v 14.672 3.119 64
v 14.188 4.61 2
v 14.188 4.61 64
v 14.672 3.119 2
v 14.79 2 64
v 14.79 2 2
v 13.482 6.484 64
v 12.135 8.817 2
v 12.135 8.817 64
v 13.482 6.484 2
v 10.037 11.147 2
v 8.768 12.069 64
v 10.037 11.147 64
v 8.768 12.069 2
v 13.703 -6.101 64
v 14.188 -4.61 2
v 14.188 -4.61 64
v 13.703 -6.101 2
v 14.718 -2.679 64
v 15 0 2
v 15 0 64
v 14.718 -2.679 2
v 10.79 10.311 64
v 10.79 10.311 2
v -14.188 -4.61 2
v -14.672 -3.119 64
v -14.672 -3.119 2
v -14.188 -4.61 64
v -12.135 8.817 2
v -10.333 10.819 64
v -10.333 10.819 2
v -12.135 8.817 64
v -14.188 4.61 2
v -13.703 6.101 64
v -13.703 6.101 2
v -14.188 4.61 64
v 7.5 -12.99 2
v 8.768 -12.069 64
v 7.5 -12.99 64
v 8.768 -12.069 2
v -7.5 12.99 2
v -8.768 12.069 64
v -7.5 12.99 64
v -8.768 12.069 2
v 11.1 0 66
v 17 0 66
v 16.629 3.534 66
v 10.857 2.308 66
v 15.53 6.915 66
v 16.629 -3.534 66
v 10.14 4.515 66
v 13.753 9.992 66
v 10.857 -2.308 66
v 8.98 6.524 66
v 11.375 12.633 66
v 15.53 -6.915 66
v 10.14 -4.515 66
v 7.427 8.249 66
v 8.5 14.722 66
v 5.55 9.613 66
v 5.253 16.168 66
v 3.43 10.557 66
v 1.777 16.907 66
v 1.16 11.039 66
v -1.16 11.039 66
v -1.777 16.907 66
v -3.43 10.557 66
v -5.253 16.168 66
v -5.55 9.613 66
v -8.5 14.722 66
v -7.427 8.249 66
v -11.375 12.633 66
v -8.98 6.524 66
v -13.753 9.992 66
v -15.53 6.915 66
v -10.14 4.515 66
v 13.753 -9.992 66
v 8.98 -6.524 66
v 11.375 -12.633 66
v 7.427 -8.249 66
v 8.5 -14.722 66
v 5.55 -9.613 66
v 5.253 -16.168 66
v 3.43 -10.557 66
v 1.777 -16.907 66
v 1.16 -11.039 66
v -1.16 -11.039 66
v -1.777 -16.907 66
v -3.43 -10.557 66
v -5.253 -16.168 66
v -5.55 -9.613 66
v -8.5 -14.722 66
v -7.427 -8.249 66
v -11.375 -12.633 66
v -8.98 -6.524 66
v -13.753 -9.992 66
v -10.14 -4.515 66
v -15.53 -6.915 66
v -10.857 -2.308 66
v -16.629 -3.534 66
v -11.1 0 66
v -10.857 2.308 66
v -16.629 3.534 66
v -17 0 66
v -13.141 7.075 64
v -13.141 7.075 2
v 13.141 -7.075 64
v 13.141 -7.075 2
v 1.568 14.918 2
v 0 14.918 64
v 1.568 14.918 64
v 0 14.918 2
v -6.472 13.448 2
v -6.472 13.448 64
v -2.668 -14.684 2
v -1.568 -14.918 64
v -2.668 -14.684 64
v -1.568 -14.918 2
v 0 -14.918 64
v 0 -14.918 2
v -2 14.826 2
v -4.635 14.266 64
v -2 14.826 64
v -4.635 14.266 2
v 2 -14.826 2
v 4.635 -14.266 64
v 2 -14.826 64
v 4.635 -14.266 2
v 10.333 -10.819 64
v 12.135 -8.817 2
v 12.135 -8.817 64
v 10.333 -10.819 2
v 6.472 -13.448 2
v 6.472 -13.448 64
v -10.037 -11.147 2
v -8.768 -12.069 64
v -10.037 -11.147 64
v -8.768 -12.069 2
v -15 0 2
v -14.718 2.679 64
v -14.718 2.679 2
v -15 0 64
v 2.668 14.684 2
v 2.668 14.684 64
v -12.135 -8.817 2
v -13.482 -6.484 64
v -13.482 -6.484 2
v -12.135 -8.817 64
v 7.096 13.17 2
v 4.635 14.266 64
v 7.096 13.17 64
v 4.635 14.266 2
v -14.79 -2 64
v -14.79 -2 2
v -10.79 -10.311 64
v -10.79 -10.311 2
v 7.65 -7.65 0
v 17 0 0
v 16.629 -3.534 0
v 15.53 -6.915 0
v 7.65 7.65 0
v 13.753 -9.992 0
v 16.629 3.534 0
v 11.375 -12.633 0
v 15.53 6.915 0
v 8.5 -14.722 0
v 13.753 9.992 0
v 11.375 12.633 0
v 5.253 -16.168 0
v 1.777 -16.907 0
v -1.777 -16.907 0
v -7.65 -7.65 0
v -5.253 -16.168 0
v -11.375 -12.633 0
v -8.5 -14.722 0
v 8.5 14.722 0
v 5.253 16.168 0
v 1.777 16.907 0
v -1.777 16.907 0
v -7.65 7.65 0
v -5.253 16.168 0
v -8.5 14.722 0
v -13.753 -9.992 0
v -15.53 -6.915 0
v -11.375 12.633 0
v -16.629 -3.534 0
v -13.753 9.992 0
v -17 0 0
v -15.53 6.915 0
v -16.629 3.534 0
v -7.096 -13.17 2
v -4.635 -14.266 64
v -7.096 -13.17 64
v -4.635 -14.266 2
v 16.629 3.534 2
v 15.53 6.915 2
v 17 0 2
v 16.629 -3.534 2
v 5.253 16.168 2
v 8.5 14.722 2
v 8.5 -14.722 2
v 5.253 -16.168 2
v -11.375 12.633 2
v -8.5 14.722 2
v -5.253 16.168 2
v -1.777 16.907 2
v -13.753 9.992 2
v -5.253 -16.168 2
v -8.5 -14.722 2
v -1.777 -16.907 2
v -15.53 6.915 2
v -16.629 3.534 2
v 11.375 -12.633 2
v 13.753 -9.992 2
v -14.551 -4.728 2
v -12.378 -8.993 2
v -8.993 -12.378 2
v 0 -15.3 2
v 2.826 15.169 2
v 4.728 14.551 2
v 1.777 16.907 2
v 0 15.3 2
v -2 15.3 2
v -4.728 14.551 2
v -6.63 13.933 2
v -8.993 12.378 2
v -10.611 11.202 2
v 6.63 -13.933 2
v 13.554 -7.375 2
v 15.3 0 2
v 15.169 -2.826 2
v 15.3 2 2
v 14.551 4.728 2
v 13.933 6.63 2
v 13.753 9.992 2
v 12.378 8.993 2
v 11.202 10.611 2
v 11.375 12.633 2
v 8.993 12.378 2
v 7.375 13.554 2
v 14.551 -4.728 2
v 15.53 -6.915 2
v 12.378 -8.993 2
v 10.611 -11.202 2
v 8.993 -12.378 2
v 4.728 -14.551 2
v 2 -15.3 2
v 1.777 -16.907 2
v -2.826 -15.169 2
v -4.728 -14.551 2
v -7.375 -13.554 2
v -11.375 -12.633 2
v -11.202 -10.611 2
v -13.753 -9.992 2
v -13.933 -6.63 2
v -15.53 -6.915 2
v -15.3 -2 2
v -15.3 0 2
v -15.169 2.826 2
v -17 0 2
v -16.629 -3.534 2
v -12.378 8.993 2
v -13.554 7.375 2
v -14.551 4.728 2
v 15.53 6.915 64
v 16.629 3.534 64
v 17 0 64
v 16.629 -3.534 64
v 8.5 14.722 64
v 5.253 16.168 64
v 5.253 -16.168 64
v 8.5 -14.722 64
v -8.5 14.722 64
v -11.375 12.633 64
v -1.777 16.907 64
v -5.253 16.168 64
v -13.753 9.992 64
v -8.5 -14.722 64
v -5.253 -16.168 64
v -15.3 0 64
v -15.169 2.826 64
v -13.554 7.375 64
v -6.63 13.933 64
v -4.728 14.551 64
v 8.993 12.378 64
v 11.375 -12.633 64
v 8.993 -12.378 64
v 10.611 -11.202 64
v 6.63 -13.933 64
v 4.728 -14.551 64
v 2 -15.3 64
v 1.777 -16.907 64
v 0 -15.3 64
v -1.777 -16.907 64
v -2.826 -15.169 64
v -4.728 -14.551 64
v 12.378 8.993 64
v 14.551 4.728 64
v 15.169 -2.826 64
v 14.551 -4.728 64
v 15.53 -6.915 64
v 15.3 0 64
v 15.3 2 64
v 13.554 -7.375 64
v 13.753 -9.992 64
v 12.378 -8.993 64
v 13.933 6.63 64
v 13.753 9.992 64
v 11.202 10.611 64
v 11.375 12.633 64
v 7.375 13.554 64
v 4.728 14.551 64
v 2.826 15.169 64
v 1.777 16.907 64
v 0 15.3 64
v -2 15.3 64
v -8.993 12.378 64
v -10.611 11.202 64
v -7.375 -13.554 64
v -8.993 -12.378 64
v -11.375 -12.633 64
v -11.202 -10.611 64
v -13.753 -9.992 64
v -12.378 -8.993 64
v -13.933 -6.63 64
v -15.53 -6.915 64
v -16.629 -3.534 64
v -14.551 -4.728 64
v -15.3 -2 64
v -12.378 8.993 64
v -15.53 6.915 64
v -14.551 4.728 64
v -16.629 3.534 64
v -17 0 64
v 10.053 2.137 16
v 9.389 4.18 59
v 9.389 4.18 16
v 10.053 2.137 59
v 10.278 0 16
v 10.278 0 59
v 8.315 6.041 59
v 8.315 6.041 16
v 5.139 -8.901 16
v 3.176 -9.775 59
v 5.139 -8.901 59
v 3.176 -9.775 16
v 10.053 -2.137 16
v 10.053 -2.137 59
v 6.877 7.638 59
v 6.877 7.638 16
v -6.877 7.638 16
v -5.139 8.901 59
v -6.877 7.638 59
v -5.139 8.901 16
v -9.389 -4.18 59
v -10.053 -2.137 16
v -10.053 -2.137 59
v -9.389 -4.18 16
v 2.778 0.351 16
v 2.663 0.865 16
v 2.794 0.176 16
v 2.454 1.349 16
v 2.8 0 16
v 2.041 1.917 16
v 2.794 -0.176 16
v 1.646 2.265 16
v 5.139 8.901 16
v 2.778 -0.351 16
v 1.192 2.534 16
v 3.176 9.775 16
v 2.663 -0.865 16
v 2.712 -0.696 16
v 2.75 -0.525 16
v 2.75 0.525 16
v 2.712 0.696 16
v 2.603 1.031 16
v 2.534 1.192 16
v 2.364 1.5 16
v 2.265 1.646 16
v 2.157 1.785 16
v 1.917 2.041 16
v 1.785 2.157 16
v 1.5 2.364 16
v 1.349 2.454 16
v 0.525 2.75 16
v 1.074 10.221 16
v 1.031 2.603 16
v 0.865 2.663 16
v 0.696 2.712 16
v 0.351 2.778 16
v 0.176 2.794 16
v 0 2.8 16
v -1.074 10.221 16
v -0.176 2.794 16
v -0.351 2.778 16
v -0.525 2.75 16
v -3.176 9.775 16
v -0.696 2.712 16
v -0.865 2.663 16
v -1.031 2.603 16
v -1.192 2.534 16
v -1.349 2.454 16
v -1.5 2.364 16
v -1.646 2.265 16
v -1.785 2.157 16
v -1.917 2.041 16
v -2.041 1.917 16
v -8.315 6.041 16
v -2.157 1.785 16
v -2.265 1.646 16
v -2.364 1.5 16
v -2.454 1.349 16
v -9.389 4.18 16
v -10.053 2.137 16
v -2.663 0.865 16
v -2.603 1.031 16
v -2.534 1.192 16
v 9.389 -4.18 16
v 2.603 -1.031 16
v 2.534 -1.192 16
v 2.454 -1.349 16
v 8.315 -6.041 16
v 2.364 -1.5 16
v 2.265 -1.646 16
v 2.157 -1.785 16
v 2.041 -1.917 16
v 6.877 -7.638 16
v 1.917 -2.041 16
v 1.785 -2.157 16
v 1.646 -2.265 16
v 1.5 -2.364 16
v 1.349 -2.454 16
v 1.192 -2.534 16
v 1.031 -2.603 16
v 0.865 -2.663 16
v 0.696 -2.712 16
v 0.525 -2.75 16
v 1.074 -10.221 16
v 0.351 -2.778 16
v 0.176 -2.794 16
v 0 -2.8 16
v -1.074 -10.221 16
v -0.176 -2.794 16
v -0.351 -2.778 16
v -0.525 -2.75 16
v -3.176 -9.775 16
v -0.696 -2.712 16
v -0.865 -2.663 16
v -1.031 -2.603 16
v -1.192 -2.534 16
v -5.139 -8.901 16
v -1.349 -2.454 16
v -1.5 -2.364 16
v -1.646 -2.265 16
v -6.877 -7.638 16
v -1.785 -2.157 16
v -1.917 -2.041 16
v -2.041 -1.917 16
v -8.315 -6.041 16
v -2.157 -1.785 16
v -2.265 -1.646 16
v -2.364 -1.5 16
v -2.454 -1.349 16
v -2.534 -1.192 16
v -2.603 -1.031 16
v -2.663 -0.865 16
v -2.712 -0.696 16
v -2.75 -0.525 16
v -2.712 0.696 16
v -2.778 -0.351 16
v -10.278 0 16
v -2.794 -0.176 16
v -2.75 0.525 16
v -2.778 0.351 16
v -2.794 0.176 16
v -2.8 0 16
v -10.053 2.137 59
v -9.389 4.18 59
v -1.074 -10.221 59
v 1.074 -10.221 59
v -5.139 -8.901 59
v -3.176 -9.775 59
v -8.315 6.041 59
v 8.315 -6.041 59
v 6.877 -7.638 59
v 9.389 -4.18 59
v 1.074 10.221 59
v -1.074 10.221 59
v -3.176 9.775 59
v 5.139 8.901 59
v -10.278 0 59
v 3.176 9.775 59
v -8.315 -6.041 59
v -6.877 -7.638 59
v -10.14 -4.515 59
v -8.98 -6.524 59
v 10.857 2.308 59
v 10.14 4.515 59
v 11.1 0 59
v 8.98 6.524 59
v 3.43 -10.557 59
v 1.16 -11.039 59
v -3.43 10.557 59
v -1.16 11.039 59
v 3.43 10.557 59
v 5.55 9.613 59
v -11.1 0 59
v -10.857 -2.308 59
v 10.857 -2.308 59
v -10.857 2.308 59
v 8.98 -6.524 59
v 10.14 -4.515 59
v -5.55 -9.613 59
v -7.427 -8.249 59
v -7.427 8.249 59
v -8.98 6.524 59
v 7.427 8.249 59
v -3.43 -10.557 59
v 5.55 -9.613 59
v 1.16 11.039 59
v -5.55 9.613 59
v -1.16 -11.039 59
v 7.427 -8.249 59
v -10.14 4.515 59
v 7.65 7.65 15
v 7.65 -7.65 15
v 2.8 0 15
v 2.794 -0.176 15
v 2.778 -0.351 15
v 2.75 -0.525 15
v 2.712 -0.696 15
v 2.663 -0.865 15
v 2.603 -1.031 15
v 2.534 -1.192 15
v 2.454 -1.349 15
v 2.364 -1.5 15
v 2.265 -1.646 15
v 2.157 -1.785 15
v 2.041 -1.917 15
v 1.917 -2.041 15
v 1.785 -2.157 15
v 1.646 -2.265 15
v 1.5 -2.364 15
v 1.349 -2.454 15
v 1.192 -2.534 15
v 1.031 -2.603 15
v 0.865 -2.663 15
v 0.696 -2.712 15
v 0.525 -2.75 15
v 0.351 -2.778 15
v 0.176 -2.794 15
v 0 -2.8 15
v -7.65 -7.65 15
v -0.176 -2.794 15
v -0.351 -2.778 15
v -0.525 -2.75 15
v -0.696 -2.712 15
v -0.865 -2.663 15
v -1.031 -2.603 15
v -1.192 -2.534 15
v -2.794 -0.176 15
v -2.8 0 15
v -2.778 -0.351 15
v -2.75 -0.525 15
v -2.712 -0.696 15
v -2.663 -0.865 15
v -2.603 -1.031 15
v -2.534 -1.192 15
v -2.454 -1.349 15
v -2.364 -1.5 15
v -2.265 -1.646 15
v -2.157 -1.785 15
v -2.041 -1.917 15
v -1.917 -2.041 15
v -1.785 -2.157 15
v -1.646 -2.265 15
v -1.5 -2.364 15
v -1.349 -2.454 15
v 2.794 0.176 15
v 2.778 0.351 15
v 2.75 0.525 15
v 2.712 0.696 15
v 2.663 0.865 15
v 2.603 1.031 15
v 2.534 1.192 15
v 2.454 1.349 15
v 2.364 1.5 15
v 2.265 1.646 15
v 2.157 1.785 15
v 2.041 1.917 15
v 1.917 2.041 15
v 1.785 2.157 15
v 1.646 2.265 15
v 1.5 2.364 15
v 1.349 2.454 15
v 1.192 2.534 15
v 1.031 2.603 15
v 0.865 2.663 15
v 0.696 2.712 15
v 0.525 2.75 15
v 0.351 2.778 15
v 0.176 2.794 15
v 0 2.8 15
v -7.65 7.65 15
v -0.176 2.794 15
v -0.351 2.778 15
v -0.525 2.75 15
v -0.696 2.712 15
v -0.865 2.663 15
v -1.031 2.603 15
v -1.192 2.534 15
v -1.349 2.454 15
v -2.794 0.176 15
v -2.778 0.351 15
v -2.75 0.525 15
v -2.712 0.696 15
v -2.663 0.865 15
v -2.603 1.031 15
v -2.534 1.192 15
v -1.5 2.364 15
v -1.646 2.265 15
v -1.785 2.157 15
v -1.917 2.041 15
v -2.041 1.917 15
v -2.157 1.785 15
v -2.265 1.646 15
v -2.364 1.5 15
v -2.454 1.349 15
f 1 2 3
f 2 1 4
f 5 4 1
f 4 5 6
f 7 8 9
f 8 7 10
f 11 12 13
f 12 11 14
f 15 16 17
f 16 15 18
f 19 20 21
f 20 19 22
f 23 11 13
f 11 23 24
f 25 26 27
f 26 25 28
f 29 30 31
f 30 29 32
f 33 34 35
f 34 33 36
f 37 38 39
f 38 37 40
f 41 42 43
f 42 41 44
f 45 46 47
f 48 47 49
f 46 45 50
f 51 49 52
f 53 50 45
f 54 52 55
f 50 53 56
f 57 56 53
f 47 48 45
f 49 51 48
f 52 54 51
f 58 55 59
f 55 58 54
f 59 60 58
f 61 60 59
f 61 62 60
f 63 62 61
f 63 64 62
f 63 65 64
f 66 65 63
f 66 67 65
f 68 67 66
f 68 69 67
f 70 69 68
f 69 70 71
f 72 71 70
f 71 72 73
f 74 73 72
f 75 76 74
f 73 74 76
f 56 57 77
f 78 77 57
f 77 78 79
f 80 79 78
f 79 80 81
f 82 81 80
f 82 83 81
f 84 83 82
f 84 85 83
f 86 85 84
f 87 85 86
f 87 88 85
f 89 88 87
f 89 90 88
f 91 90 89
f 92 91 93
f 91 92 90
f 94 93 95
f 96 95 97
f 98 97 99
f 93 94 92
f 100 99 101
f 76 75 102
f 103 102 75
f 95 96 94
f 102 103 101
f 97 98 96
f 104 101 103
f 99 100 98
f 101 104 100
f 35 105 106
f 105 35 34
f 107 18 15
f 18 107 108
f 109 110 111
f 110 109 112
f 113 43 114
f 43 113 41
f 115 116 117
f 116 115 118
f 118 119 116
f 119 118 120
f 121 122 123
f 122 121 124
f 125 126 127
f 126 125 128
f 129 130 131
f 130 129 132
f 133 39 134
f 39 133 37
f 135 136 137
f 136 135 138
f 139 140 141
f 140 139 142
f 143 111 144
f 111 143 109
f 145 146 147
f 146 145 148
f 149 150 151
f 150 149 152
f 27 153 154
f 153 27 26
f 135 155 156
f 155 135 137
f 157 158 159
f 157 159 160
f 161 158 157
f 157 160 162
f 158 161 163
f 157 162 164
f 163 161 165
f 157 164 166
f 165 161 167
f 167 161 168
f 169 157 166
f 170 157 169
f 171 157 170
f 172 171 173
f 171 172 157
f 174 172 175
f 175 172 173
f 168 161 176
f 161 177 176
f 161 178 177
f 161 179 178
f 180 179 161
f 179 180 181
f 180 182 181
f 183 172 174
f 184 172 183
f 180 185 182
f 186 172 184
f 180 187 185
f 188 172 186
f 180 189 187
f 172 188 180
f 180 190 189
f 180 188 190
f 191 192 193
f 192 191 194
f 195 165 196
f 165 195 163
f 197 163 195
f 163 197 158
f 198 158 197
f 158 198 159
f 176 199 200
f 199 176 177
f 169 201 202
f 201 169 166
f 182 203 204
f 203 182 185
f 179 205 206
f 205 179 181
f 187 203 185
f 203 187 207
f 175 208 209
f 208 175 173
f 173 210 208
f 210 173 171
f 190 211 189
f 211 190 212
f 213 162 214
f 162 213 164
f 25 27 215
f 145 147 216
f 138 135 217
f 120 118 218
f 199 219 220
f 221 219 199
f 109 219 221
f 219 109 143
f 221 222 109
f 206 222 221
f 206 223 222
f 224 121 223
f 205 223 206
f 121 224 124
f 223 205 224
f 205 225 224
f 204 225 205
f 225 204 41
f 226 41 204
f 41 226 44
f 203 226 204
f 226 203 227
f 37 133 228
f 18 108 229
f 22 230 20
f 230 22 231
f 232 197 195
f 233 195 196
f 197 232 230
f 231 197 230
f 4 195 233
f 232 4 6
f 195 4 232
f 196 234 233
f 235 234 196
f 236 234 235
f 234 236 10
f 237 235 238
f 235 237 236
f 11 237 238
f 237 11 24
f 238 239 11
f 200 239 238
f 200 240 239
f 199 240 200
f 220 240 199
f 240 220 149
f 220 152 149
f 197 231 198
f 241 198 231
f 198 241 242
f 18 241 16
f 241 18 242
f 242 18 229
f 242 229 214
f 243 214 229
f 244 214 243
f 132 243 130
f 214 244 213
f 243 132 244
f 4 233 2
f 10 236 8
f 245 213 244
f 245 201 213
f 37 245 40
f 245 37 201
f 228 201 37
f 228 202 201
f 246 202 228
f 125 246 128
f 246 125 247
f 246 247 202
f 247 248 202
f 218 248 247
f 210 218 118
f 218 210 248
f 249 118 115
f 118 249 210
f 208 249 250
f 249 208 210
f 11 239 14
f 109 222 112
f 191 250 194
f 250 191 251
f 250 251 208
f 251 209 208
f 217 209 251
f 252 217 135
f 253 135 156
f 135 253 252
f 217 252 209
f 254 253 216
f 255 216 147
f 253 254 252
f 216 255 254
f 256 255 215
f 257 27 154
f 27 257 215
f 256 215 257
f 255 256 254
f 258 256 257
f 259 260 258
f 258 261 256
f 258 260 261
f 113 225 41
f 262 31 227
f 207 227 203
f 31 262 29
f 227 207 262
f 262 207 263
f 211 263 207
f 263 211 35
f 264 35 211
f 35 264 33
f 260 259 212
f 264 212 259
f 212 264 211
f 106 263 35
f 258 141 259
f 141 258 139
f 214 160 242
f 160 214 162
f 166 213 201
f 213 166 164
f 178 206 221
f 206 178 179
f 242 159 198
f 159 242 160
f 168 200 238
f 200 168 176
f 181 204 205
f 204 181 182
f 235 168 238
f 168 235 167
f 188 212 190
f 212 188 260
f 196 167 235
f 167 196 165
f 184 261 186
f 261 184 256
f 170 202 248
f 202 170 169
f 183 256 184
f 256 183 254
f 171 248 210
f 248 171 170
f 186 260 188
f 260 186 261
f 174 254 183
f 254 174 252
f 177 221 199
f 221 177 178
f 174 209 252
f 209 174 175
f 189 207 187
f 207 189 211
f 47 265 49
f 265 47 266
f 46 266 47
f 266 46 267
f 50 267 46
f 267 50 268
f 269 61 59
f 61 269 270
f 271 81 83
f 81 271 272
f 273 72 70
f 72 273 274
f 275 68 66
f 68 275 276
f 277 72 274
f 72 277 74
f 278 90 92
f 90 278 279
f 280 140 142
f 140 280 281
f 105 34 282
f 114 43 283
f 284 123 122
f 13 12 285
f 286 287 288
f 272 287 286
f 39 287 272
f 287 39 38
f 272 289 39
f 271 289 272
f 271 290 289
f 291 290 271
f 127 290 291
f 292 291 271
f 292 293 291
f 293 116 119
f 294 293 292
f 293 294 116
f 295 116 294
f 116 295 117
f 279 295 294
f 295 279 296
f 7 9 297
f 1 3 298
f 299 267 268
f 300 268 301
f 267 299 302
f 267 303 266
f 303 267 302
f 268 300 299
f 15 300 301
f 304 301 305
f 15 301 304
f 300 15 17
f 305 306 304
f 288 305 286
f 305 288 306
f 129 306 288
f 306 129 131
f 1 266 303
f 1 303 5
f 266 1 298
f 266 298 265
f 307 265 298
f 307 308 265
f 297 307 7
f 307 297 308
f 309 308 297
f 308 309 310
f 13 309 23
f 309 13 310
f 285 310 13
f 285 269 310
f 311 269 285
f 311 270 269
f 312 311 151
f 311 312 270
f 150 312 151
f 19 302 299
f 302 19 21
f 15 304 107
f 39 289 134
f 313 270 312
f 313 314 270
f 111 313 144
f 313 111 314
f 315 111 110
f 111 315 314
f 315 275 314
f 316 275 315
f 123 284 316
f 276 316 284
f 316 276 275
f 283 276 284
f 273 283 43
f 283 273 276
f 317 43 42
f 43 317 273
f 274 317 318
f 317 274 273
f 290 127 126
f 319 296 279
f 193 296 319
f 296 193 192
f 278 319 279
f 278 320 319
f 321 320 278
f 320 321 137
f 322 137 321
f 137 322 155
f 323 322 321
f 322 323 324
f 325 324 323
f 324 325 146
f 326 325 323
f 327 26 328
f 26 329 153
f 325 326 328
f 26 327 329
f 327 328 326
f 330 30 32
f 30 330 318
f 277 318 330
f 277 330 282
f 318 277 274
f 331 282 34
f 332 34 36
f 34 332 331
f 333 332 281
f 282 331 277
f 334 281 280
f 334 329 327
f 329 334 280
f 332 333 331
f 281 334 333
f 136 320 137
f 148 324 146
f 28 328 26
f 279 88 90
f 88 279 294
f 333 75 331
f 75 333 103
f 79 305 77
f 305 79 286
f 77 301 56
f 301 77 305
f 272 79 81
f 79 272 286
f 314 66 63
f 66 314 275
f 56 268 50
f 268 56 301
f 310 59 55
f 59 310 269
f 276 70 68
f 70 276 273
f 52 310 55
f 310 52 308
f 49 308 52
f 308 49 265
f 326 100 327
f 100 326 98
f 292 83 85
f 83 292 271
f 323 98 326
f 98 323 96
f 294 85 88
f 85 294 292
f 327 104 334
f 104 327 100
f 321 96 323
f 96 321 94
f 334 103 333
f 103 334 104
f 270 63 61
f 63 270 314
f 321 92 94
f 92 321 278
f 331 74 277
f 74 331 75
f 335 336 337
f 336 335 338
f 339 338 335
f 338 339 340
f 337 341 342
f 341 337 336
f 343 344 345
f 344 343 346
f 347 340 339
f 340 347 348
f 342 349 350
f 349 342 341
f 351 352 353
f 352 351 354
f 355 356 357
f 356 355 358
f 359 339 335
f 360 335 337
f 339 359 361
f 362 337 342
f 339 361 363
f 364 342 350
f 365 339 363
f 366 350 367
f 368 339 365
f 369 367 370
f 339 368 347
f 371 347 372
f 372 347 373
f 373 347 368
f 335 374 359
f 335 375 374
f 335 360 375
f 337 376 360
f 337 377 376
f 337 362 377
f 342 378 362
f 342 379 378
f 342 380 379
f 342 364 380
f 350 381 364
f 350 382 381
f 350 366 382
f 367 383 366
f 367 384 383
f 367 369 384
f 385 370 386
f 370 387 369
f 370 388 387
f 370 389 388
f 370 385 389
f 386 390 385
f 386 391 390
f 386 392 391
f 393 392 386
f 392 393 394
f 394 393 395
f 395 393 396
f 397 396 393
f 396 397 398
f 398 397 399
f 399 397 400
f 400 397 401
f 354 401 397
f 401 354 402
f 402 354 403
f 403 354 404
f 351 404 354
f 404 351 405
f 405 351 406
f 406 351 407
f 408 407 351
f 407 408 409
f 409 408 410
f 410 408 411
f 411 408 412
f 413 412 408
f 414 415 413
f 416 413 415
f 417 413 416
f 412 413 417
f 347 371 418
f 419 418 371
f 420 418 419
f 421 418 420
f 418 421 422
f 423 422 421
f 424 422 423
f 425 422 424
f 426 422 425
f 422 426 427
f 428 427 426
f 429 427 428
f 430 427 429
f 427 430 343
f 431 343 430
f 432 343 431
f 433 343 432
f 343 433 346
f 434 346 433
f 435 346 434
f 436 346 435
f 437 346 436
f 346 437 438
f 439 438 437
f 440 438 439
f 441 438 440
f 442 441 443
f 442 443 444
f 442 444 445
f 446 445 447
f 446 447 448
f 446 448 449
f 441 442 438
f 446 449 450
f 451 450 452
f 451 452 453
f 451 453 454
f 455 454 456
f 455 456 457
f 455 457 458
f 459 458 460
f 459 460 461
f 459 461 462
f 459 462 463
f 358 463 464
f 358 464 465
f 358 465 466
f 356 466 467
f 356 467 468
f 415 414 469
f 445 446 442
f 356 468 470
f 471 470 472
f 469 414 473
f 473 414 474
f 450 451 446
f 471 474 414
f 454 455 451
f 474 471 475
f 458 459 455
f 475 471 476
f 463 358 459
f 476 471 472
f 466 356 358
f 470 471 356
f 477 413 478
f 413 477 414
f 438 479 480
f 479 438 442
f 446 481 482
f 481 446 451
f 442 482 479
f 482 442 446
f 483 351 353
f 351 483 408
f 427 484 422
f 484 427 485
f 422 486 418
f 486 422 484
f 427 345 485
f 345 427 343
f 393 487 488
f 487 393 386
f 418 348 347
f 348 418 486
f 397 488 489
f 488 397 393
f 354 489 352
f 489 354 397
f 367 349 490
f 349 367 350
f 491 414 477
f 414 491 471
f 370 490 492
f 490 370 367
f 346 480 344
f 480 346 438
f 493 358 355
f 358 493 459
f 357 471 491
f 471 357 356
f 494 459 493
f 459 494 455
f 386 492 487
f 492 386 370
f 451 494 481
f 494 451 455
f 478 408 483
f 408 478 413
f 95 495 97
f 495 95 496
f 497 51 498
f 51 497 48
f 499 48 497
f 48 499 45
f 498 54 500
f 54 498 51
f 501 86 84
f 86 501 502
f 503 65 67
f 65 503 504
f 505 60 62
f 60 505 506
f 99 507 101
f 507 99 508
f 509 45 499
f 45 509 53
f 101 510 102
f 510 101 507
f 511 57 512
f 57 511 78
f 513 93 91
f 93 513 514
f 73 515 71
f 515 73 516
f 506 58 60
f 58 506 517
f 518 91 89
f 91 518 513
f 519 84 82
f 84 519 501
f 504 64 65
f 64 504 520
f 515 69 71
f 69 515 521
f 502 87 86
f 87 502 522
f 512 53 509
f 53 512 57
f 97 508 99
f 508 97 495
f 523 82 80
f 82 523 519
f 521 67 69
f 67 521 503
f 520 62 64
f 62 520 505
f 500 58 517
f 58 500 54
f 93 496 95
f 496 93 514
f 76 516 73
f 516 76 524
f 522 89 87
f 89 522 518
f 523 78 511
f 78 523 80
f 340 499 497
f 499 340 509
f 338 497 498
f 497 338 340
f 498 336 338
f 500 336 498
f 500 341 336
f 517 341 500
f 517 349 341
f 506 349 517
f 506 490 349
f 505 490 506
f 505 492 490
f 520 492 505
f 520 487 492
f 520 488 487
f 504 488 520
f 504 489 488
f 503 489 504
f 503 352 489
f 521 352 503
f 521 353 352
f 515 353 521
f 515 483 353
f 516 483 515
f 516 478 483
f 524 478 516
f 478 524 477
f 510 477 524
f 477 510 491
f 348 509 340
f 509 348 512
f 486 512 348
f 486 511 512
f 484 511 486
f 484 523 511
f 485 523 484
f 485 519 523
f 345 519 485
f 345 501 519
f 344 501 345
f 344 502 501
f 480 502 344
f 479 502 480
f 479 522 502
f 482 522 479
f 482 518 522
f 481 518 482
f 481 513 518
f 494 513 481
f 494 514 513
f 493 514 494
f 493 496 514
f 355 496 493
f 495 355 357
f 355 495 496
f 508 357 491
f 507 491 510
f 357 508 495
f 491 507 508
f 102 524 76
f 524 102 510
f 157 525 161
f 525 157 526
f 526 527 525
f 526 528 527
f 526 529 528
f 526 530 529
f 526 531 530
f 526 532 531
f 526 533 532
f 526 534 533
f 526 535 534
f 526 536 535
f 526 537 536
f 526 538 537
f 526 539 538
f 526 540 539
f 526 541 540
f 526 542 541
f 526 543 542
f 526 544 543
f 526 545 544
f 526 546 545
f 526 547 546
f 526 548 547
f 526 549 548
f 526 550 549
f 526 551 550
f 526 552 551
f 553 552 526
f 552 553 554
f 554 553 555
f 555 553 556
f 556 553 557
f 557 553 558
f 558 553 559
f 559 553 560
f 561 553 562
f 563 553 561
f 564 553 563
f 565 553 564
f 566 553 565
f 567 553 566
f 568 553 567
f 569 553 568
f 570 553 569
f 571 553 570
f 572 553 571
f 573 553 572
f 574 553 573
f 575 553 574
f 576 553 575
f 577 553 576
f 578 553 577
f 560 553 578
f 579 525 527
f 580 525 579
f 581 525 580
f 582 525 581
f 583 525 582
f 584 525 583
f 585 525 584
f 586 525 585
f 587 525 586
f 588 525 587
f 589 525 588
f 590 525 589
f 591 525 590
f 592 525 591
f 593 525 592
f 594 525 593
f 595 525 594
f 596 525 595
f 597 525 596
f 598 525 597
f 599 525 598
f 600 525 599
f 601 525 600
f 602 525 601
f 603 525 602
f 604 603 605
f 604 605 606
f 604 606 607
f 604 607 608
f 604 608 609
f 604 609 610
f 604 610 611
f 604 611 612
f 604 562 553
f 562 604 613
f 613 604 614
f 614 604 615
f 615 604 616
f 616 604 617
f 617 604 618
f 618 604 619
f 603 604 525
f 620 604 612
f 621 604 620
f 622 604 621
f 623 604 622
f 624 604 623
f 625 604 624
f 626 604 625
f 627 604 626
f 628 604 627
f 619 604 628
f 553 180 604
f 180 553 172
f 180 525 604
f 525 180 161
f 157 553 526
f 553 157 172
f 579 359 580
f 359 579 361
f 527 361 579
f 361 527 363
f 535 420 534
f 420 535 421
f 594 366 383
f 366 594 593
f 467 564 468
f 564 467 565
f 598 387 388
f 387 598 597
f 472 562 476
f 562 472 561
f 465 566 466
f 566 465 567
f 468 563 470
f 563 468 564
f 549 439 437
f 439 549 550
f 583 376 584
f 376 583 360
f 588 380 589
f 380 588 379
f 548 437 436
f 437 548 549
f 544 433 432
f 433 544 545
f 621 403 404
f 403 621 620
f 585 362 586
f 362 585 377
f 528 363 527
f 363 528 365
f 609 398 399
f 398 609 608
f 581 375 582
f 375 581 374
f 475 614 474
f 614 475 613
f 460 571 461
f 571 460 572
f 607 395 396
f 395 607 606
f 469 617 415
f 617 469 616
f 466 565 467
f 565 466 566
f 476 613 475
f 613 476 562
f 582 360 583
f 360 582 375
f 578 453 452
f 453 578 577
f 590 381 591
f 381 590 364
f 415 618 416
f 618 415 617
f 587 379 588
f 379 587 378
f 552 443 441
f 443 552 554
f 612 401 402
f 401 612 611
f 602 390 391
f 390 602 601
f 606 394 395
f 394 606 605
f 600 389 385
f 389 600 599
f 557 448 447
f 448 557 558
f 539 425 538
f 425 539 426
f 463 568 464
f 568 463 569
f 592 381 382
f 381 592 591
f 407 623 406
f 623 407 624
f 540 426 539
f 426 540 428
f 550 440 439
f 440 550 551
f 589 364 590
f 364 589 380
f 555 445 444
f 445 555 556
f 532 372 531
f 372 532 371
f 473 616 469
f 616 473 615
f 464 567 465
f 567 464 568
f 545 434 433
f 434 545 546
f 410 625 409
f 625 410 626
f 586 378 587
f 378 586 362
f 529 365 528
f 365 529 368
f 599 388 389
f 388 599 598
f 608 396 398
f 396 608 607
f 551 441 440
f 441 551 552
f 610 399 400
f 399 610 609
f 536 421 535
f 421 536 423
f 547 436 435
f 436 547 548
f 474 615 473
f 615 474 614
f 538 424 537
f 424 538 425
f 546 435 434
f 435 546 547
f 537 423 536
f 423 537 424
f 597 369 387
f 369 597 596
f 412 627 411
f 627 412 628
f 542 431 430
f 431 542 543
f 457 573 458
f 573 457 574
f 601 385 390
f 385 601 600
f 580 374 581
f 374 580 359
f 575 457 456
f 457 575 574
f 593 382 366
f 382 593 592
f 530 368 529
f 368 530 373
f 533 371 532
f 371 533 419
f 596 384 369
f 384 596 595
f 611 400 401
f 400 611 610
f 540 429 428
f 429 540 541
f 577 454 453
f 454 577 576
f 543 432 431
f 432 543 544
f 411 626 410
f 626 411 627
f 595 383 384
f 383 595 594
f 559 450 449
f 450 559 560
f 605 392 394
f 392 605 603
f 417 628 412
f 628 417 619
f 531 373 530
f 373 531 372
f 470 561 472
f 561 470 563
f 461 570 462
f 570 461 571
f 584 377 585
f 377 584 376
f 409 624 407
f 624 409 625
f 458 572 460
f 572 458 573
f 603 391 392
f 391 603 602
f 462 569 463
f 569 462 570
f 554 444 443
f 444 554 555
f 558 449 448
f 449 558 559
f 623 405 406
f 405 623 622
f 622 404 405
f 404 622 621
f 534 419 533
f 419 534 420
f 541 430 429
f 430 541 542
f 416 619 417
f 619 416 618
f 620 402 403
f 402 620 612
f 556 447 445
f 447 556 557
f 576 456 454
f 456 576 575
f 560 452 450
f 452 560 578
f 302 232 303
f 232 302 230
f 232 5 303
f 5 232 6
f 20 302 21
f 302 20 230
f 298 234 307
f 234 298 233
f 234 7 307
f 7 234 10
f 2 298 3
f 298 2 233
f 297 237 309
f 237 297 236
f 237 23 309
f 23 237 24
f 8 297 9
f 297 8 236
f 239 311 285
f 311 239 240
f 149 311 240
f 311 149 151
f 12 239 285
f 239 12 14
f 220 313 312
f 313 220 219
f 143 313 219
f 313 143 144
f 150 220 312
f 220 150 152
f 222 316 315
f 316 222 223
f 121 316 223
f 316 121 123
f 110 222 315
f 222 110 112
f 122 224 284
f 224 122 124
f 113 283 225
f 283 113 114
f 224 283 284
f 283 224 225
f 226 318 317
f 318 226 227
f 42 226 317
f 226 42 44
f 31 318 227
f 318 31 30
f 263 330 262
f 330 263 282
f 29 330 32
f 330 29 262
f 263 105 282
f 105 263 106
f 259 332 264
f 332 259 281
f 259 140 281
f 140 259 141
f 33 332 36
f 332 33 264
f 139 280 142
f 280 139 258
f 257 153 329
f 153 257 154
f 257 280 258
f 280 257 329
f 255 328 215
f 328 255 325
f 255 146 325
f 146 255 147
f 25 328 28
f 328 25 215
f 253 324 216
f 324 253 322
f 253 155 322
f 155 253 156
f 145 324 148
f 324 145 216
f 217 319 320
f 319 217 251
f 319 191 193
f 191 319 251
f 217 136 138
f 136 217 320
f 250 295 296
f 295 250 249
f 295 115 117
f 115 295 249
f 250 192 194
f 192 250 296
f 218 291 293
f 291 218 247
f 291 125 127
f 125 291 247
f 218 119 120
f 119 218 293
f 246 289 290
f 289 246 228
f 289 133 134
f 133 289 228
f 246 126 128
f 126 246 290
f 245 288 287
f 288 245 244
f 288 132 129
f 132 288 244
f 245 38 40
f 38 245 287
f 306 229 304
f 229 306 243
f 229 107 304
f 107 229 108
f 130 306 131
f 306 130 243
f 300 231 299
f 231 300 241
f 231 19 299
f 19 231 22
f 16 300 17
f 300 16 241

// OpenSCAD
// Jim Samson
// Spool with teeth for rat project 
// November 14, 2018

offsetForEnds=6;

beltHeight=60+(offsetForEnds); // millimeters
diameterForBelt=30;

diameterForEdgesHeight=2;
diameterForEdges = diameterForBelt + 4;

bearingDiameter=22.2;
bearingHeight=8;

spoolHolder();

module spoolHolder() {
    union() {
        difference() {
            spool();
            middleShaft();
            bearings();
            gear();
            tube();
        }
        gripHolders();
    }
}

module tube() {
    translate([0,0,-1]) {
        cylinder(d=5.6,h=beltHeight+1,$fn=100);
    }
}

module gear() {
   //translate([-11,-11.1,-1]) {
        //import("SGearSpurV1_fixed.stl", convexity=10); 
    //}
    translate([0,0,0]) {
        cube([15.3,15.3,30],center=true);
    }
}

module gripHolders() {
    n=20;
    for(i=[0:n]) {
        rotate([0,0,i*360/n]) {
            translate([(diameterForBelt/2)-1.7,0,2]) { 
                cube([2,2,beltHeight-4]);
            }
        }
    }
}

module teethHolder() {
    cylinder(d=bearingDiameter,h=beltHeight);
}

module middleShaft() {
    translate([0,0,16]) {
        cylinder(d=bearingDiameter/1.08,h=beltHeight);
    }
}

module bearings() {
    translate([0,0,beltHeight-bearingHeight+1]) {
        cylinder(d=bearingDiameter,h=bearingHeight);
    }
}

module spool() {
    cylinder(d=diameterForBelt,h=beltHeight);
    
    cylinder(d=diameterForEdges,h=diameterForEdgesHeight);
    translate([0,0,beltHeight-2]) {
        cylinder(d=diameterForEdges,h=diameterForEdgesHeight);
    }
}
